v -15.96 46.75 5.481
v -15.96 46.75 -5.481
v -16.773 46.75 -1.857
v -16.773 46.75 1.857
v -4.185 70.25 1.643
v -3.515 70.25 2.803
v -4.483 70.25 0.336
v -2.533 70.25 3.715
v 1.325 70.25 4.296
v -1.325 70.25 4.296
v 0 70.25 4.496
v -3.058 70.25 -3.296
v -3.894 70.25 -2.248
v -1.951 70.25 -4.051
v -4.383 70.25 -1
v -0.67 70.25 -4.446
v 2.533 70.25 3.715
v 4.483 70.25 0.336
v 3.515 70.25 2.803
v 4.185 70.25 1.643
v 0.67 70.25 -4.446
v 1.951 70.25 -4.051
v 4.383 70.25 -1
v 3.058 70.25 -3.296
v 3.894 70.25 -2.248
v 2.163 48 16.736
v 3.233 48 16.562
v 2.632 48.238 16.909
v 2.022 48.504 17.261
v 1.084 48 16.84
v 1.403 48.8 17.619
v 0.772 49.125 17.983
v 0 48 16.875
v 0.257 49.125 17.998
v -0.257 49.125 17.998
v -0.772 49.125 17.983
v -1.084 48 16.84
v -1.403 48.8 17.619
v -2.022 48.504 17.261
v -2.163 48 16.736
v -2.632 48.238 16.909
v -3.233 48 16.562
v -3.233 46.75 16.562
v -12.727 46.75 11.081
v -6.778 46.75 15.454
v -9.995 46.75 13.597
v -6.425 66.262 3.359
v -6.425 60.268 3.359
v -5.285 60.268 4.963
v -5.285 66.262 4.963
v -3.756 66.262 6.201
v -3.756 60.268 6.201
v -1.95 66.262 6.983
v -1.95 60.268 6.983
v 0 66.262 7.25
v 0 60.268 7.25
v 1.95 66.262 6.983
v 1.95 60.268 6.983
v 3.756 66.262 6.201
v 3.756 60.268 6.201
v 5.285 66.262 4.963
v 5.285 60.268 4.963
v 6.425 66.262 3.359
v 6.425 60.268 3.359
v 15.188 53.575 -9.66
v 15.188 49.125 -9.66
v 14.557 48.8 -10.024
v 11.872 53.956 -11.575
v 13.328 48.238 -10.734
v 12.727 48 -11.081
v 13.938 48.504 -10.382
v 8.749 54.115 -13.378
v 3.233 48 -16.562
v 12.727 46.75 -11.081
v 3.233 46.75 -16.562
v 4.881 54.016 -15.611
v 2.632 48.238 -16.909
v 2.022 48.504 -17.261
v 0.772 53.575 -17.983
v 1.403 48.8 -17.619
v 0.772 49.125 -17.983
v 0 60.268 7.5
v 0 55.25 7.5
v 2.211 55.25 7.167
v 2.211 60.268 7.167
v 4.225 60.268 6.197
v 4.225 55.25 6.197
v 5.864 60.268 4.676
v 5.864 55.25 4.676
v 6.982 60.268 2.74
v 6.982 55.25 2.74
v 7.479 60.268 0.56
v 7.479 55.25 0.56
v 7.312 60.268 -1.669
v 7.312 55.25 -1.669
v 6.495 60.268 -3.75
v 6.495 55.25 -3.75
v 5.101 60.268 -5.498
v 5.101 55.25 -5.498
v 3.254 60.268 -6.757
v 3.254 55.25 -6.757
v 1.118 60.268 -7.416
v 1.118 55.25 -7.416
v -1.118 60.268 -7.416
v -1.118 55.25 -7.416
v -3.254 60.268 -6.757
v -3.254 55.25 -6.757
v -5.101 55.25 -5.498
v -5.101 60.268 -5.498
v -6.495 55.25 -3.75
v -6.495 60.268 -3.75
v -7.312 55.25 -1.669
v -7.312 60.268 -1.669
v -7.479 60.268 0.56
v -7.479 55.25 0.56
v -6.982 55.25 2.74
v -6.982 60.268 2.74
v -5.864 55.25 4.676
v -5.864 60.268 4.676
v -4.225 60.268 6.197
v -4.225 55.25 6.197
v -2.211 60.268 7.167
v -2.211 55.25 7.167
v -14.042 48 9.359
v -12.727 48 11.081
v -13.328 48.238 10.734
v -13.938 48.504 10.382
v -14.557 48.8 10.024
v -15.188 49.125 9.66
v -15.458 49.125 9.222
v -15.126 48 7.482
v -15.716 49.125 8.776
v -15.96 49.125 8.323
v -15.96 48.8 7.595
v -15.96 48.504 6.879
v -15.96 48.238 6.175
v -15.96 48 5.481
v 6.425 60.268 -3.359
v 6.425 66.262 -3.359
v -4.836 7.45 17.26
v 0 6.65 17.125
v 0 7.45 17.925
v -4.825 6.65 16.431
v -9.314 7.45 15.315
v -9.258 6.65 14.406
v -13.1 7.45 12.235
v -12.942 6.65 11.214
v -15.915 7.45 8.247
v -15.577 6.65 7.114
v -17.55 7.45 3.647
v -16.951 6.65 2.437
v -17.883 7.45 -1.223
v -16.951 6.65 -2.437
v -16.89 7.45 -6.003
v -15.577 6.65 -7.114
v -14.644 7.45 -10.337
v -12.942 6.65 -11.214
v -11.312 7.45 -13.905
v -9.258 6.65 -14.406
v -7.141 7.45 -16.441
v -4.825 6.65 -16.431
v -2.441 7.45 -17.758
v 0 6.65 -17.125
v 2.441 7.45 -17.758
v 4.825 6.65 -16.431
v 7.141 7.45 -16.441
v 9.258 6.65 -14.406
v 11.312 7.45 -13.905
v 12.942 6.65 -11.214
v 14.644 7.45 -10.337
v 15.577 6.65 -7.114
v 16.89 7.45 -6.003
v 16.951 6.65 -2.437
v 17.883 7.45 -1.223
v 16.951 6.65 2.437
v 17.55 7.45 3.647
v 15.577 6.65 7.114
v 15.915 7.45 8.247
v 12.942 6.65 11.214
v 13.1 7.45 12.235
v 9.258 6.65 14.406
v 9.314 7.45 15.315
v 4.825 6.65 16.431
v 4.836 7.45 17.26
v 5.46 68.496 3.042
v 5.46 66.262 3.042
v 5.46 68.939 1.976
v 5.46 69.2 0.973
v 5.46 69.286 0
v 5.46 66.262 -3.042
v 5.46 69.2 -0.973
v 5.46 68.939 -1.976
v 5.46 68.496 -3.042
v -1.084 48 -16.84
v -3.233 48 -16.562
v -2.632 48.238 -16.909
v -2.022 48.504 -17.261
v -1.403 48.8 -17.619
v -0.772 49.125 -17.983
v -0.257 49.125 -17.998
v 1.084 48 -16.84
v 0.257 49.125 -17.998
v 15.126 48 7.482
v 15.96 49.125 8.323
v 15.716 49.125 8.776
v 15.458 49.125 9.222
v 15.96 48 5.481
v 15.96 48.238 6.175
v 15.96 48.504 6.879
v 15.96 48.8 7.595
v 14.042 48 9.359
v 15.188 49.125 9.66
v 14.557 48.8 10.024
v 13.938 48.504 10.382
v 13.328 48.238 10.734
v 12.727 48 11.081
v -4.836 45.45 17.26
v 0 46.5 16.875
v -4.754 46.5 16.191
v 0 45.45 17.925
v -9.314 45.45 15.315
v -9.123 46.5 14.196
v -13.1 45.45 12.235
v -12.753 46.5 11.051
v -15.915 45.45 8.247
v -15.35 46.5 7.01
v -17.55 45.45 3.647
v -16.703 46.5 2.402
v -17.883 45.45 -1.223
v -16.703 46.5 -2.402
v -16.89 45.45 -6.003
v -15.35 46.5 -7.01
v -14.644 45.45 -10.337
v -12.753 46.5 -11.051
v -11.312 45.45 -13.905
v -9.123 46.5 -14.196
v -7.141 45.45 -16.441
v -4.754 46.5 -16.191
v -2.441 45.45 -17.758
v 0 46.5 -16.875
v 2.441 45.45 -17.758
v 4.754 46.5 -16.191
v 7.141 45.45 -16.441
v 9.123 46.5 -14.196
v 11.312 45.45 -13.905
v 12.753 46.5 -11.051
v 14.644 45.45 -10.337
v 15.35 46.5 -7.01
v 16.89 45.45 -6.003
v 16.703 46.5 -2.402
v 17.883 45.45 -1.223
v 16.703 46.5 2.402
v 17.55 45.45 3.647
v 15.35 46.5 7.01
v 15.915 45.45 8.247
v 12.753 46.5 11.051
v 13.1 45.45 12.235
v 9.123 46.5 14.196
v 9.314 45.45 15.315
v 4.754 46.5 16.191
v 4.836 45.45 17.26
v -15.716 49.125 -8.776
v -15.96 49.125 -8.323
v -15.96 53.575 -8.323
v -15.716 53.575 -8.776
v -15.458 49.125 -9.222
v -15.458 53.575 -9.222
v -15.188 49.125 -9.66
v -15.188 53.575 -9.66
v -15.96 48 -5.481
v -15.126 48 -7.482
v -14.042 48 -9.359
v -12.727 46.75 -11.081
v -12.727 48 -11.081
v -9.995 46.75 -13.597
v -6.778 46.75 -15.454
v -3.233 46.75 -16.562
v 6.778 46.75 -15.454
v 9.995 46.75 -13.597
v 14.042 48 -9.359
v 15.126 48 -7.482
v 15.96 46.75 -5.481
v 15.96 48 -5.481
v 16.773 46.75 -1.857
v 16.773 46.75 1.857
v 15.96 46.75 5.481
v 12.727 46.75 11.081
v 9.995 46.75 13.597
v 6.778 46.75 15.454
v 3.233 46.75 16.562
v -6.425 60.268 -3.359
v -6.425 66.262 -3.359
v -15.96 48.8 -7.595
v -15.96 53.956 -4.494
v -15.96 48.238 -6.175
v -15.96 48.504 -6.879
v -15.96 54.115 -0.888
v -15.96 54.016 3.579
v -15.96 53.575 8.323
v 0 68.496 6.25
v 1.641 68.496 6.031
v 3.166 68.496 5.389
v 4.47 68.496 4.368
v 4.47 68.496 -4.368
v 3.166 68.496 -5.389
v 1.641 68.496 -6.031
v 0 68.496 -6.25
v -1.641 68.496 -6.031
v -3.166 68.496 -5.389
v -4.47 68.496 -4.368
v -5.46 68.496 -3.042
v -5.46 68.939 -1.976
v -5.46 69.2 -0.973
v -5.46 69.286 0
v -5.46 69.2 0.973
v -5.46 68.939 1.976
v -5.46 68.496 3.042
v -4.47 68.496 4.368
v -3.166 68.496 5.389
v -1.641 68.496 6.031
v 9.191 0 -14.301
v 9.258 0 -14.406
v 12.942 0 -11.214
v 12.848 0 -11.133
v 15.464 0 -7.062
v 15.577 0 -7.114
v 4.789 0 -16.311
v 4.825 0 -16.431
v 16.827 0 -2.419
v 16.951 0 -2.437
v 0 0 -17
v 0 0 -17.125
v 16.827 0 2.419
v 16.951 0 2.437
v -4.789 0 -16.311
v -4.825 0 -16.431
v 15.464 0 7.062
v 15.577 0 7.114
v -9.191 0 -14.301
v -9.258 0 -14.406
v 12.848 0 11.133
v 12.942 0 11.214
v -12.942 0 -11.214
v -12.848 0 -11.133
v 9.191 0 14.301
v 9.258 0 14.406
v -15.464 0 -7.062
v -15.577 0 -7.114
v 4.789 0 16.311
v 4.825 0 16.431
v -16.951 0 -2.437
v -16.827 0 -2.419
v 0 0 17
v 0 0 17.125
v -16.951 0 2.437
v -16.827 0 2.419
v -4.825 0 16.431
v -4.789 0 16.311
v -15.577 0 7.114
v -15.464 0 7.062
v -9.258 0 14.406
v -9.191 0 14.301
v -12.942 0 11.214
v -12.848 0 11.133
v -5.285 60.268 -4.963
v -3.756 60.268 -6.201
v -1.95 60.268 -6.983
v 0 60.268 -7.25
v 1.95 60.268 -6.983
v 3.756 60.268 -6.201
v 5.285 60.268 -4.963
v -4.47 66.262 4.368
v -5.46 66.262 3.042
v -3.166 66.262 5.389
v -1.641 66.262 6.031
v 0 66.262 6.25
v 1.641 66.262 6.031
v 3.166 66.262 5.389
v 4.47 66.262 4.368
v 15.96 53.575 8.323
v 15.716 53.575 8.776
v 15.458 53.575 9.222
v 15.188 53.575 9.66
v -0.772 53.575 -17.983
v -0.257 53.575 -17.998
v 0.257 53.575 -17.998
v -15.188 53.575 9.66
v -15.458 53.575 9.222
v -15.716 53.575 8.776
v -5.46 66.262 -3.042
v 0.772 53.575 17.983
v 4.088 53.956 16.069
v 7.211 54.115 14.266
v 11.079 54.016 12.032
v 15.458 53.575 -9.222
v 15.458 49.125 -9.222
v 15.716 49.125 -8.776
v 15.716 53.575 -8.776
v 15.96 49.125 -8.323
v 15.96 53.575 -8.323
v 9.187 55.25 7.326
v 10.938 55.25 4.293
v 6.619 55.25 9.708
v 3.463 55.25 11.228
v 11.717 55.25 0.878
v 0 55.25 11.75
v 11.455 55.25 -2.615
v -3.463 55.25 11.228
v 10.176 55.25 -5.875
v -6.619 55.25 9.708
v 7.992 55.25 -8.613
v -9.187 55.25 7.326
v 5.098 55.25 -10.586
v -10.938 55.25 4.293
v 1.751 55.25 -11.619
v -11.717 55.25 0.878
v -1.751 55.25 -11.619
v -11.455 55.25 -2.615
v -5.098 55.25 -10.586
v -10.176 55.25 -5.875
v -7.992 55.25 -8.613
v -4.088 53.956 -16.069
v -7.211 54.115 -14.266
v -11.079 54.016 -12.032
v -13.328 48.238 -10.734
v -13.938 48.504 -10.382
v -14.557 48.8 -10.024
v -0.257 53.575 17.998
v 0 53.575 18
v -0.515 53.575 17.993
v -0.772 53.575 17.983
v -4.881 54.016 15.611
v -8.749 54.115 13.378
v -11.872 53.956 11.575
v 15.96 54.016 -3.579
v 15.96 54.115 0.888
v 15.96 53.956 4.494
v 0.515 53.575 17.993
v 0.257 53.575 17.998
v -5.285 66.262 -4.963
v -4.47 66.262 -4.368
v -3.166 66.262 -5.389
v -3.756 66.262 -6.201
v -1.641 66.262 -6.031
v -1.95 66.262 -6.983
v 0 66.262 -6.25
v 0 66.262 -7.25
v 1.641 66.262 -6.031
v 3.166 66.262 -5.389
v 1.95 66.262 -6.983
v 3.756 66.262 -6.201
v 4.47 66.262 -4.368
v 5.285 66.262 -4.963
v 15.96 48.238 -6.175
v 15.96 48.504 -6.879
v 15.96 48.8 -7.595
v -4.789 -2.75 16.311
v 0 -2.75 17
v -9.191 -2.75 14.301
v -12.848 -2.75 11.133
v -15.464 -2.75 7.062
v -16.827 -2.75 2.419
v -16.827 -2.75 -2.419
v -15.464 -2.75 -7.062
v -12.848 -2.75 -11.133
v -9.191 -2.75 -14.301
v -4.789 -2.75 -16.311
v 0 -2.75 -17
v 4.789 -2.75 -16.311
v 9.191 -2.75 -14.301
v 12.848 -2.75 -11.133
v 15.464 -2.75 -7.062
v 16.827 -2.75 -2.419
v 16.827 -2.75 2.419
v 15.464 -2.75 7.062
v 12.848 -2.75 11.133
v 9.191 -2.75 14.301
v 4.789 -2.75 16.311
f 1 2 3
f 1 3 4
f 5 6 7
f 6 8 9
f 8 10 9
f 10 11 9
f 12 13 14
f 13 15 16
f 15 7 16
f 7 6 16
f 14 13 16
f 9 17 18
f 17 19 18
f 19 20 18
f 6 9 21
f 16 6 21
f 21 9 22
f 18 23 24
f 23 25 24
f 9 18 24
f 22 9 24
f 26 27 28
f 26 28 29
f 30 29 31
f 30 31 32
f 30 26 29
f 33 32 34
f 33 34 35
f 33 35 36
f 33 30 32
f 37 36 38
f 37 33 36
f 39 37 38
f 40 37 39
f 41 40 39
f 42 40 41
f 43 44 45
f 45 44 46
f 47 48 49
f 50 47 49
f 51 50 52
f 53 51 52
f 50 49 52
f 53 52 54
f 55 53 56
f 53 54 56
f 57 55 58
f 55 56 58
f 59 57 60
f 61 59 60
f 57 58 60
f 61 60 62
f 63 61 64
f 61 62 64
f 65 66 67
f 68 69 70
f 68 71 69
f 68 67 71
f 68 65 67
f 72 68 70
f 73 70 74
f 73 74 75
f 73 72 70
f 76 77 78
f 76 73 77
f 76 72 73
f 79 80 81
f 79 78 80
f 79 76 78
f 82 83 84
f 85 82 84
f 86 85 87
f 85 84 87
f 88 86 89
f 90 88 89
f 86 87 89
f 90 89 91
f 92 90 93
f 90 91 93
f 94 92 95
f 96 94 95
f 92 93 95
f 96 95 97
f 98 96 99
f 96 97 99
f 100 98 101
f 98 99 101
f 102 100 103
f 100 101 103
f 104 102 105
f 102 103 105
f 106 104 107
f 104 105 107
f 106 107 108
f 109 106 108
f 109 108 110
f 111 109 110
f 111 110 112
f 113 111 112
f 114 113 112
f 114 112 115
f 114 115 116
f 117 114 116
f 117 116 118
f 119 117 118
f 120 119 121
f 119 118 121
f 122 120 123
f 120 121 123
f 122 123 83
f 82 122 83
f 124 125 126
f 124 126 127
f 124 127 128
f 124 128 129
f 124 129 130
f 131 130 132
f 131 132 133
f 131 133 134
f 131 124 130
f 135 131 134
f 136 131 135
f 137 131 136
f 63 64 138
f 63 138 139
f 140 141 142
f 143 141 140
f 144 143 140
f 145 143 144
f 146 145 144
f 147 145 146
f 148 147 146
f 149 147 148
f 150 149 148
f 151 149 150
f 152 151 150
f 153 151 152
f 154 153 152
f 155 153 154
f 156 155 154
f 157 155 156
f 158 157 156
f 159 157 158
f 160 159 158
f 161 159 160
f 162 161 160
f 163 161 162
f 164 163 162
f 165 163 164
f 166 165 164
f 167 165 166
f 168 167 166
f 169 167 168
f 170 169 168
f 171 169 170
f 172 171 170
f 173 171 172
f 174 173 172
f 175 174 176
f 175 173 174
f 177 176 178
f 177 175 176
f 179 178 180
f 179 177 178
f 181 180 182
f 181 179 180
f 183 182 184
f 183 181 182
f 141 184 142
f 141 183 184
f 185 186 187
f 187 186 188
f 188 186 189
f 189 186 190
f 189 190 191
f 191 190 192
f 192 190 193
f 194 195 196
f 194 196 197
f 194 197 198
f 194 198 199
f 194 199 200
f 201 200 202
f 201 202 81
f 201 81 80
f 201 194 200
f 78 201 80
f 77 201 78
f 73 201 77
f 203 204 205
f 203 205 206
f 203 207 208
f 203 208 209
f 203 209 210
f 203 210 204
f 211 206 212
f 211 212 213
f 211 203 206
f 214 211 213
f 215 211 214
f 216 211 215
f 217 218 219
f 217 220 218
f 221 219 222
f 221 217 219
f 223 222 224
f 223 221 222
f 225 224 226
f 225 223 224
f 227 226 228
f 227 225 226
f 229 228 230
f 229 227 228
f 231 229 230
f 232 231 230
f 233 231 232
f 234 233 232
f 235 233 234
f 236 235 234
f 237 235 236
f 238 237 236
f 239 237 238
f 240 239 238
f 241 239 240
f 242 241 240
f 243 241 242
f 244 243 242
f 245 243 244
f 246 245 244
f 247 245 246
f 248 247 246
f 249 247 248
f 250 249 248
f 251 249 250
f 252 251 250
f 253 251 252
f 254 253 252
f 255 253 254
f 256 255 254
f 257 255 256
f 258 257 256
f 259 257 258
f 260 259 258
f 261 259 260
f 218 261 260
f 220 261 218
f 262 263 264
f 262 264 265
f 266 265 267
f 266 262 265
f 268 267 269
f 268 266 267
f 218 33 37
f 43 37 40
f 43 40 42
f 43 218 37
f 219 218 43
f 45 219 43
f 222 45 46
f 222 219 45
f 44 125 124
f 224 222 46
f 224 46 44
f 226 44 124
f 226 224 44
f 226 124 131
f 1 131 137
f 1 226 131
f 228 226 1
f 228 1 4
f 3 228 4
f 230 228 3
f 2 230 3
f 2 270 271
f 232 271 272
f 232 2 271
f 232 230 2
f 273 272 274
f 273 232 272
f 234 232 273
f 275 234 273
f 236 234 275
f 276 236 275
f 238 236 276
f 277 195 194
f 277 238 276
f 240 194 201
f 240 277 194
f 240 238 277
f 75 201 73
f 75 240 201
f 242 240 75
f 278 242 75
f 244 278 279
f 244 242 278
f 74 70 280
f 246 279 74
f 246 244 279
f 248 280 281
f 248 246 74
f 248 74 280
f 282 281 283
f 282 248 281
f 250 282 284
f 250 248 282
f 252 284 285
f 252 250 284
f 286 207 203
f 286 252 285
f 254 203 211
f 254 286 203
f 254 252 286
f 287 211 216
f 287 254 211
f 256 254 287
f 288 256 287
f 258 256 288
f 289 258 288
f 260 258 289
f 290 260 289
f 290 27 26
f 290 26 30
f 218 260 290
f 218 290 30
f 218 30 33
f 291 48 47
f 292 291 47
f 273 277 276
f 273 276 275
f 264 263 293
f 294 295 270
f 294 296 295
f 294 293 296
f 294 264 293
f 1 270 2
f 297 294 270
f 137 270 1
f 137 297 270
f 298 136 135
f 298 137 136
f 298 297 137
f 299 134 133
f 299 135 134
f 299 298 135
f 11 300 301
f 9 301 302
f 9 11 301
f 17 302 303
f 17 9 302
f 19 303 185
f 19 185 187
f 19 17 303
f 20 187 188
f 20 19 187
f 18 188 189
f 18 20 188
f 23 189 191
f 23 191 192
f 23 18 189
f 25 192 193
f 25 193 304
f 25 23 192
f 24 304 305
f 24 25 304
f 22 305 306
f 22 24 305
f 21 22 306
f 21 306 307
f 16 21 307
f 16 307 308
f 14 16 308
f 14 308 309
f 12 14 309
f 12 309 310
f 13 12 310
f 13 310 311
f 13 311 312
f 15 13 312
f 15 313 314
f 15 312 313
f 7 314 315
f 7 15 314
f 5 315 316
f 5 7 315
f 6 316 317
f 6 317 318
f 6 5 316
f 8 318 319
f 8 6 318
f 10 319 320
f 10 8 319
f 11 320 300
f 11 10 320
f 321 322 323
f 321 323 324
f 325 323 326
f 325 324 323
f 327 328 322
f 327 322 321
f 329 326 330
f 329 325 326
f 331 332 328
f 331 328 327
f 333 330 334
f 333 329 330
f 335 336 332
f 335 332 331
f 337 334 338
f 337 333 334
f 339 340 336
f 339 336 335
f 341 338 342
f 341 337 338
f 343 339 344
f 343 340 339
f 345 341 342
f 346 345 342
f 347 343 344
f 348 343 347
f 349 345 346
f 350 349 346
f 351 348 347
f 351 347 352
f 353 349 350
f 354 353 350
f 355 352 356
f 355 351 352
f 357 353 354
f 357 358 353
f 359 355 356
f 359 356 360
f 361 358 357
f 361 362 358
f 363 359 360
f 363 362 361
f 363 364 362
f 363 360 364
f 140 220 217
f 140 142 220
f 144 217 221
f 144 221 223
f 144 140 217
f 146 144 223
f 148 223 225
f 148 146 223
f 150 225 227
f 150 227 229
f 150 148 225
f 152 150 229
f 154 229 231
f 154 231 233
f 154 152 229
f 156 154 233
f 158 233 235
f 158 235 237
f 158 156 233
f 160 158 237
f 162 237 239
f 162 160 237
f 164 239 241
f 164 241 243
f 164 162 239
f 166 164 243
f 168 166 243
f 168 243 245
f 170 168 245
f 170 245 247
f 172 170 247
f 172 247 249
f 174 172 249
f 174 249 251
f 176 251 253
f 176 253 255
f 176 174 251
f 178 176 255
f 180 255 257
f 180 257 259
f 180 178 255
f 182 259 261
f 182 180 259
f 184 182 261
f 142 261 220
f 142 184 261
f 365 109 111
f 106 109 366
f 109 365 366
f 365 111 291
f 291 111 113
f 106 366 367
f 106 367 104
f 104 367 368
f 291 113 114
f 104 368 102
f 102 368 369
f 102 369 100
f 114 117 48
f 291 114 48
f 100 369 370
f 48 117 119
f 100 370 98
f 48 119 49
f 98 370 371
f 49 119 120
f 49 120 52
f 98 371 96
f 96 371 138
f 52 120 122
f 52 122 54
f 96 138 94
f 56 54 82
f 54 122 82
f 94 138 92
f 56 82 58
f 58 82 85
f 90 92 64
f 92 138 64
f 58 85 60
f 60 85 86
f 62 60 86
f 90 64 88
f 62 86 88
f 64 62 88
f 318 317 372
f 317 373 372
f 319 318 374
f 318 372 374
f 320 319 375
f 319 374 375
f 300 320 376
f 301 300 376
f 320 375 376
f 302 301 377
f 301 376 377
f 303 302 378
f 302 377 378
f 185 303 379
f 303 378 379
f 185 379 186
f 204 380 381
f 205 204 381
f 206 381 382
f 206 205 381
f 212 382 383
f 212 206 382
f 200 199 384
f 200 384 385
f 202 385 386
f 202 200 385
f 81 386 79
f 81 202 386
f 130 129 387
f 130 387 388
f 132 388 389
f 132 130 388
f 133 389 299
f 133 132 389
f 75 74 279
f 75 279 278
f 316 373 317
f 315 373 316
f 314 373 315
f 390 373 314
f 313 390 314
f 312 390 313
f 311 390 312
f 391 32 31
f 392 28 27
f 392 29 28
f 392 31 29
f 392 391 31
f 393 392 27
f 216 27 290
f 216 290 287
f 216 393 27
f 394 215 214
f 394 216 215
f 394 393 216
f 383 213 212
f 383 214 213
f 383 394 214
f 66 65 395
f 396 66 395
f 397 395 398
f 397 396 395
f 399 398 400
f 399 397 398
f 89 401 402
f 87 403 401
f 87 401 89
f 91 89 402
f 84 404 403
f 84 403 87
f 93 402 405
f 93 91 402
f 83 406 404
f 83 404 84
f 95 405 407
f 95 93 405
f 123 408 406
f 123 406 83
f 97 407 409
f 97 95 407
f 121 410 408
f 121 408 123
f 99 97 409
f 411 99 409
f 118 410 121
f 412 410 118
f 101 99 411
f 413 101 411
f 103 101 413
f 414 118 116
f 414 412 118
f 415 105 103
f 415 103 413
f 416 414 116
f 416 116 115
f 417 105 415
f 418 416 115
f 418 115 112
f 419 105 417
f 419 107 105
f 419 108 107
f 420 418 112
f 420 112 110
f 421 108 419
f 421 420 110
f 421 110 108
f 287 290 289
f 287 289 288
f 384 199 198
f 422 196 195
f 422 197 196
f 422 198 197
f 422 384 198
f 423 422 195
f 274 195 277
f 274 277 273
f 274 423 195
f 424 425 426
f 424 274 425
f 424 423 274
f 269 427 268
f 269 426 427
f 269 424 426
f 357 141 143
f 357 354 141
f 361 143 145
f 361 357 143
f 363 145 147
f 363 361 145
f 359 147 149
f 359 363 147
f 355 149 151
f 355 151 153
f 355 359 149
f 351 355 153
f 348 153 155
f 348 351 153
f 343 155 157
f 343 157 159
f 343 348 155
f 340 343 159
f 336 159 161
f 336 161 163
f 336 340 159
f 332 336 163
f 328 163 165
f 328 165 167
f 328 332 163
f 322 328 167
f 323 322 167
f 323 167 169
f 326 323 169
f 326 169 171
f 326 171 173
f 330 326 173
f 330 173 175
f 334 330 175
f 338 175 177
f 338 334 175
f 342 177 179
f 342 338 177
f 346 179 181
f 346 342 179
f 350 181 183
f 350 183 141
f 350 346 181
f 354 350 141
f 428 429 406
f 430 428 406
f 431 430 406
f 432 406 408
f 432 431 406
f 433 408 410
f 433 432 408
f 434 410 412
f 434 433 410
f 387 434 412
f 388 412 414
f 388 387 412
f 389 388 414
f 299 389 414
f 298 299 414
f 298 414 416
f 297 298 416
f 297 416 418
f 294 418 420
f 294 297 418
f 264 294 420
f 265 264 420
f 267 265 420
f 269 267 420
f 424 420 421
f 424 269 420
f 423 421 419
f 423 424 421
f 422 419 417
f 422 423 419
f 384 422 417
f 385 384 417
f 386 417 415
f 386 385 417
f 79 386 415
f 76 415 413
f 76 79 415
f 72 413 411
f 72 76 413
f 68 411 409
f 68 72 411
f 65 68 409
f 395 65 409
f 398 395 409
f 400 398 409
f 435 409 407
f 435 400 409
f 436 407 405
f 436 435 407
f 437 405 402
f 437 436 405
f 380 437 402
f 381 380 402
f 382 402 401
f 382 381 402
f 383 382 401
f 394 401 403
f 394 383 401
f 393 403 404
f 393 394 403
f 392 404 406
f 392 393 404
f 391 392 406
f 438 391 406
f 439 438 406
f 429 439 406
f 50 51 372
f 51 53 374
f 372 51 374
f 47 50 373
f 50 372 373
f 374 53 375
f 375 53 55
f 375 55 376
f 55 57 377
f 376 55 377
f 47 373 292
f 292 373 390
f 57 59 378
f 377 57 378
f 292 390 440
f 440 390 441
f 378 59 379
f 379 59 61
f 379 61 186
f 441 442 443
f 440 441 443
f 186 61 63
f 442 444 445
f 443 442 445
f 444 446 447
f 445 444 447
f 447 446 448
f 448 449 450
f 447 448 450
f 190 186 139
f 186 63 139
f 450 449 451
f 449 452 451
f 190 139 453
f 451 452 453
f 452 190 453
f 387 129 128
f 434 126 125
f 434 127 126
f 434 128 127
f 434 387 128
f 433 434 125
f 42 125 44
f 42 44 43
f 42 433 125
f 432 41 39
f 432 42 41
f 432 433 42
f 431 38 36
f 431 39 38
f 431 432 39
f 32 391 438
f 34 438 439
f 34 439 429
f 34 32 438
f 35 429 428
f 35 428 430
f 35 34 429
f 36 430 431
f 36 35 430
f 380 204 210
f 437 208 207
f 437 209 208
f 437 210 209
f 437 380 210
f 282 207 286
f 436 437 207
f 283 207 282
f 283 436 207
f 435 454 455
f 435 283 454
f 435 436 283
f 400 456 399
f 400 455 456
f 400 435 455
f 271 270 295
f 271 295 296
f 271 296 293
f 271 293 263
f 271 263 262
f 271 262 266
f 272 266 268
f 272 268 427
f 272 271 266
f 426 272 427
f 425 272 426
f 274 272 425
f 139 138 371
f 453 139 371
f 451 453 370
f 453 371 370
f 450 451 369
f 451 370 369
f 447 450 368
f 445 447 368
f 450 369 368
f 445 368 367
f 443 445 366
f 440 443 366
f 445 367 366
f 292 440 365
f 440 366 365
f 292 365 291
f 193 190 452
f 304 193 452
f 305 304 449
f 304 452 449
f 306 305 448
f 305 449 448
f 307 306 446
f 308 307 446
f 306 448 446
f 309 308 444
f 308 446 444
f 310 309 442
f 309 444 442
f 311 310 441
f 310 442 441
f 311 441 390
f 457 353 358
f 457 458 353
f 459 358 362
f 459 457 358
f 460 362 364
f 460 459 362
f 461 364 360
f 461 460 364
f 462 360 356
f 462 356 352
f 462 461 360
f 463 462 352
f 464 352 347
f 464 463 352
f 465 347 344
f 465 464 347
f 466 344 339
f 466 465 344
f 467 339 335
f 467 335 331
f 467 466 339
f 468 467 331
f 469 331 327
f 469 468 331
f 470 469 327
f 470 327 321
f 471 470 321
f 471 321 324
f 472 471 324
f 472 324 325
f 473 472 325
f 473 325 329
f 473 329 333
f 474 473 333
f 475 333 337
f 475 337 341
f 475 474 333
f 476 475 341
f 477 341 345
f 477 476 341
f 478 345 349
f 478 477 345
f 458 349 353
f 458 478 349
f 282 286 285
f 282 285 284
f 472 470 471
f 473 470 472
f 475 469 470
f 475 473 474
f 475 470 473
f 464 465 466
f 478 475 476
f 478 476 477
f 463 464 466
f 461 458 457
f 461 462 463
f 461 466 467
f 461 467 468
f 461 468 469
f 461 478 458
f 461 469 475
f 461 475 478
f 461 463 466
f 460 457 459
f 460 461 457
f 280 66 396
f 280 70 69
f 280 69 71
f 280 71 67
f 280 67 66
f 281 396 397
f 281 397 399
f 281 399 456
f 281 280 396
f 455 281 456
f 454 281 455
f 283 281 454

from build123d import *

# Parameters (mm, degrees)
SKETCH2_OUTSIDE_W       = 53.436
SKETCH2_OUTSIDE_H       = 53.436
CUT_EXTRUDE1_DEPTH      = 8.5
CHAMFER1_SIZE           = 1.754
SKETCH5_W               = 1.79
SKETCH5_H               = 3.988
CUT_EXTRUDE2_DEPTH      = 19
CUT_EXTRUDE2_DEPTH_BACK = 19
SKETCH6_W               = 1.075
SKETCH6_H               = 5.994
CUT_EXTRUDE3_DEPTH      = 19
CUT_EXTRUDE3_DEPTH_BACK = 19


with BuildPart() as part:
    # Sketch1 → Revolve1 (revolve)
    with BuildSketch(Plane.XY, mode=Mode.PRIVATE) as revolve1_sk:
        Polygon((-17.125, 0), (-17, 0), (-17, -2.75), (0, -2.75), (0, 55.25), (-11.75, 55.25), (-18, 53.575317547), (-18, 49.125), (-16.875, 48), (-16.875, 46.5), (-17.925, 45.45), (-17.925, 7.45), (-17.125, 6.65), align=None)
    revolve(revolve1_sk.sketch.rotate(Axis((0, 0, 0), (0, -1, 0)), 270), axis=Axis((0, 0, 0), (0, -1, 0)))  # turned: the seam where the file's is

    # Sketch2 outside → Cut-Extrude1 (cut)
    with BuildSketch(Plane(origin=(0, 55.25, 0), x_dir=(1, 0, 0), z_dir=(0, 1, 0))):
        Rectangle(SKETCH2_OUTSIDE_W, SKETCH2_OUTSIDE_H)
        Polygon((0, 18.429020593), (-15.96, 9.214510296), (-15.96, -9.214510296), (0, -18.429020593), (15.96, -9.214510296), (15.96, 9.214510296), align=None, mode=Mode.SUBTRACT)
    extrude(amount=-CUT_EXTRUDE1_DEPTH, mode=Mode.SUBTRACT)

    # Sketch4 → Revolve2 (revolve)
    with BuildSketch(Plane.XY, mode=Mode.PRIVATE) as revolve2_sk:
        Polygon((0, 70.25), (-6.25, 70.25), (-6.25, 66.262), (-7.25, 66.262), (-7.25, 60.268), (-7.5, 60.268), (-7.5, 55.25), (0, 55.25), align=None)
    revolve(revolve2_sk.sketch.rotate(Axis((0, 0, 0), (0, 1, 0)), 90), axis=Axis((0, 0, 0), (0, 1, 0)))  # turned: the seam where the file's is

    # Chamfer1
    chamfer1_edges = [part.edges().sort_by_distance(p)[0] for p in [
        (0, 70.25, -6.25),
    ]]
    chamfer(chamfer1_edges, length=CHAMFER1_SIZE)

    # Sketch5 → Cut-Extrude2 (cut, two sides)
    with BuildSketch(Plane.XY) as cut_extrude2_sk:
        with Locations((-6.355, 68.256)):
            Rectangle(SKETCH5_W, SKETCH5_H)
        with Locations((6.355, 68.256)):
            Rectangle(SKETCH5_W, SKETCH5_H)
    extrude(amount=CUT_EXTRUDE2_DEPTH, mode=Mode.SUBTRACT)
    extrude(cut_extrude2_sk.sketch, amount=-CUT_EXTRUDE2_DEPTH_BACK, mode=Mode.SUBTRACT)

    # Sketch6 → Cut-Extrude3 (cut, two sides)
    with BuildSketch(Plane.XY) as cut_extrude3_sk:
        with Locations((-6.9625, 63.265)):
            Rectangle(SKETCH6_W, SKETCH6_H)
        with Locations((6.9625, 63.265)):
            Rectangle(SKETCH6_W, SKETCH6_H)
    extrude(amount=CUT_EXTRUDE3_DEPTH, mode=Mode.SUBTRACT)
    extrude(cut_extrude3_sk.sketch, amount=-CUT_EXTRUDE3_DEPTH_BACK, mode=Mode.SUBTRACT)


solid = part.part
